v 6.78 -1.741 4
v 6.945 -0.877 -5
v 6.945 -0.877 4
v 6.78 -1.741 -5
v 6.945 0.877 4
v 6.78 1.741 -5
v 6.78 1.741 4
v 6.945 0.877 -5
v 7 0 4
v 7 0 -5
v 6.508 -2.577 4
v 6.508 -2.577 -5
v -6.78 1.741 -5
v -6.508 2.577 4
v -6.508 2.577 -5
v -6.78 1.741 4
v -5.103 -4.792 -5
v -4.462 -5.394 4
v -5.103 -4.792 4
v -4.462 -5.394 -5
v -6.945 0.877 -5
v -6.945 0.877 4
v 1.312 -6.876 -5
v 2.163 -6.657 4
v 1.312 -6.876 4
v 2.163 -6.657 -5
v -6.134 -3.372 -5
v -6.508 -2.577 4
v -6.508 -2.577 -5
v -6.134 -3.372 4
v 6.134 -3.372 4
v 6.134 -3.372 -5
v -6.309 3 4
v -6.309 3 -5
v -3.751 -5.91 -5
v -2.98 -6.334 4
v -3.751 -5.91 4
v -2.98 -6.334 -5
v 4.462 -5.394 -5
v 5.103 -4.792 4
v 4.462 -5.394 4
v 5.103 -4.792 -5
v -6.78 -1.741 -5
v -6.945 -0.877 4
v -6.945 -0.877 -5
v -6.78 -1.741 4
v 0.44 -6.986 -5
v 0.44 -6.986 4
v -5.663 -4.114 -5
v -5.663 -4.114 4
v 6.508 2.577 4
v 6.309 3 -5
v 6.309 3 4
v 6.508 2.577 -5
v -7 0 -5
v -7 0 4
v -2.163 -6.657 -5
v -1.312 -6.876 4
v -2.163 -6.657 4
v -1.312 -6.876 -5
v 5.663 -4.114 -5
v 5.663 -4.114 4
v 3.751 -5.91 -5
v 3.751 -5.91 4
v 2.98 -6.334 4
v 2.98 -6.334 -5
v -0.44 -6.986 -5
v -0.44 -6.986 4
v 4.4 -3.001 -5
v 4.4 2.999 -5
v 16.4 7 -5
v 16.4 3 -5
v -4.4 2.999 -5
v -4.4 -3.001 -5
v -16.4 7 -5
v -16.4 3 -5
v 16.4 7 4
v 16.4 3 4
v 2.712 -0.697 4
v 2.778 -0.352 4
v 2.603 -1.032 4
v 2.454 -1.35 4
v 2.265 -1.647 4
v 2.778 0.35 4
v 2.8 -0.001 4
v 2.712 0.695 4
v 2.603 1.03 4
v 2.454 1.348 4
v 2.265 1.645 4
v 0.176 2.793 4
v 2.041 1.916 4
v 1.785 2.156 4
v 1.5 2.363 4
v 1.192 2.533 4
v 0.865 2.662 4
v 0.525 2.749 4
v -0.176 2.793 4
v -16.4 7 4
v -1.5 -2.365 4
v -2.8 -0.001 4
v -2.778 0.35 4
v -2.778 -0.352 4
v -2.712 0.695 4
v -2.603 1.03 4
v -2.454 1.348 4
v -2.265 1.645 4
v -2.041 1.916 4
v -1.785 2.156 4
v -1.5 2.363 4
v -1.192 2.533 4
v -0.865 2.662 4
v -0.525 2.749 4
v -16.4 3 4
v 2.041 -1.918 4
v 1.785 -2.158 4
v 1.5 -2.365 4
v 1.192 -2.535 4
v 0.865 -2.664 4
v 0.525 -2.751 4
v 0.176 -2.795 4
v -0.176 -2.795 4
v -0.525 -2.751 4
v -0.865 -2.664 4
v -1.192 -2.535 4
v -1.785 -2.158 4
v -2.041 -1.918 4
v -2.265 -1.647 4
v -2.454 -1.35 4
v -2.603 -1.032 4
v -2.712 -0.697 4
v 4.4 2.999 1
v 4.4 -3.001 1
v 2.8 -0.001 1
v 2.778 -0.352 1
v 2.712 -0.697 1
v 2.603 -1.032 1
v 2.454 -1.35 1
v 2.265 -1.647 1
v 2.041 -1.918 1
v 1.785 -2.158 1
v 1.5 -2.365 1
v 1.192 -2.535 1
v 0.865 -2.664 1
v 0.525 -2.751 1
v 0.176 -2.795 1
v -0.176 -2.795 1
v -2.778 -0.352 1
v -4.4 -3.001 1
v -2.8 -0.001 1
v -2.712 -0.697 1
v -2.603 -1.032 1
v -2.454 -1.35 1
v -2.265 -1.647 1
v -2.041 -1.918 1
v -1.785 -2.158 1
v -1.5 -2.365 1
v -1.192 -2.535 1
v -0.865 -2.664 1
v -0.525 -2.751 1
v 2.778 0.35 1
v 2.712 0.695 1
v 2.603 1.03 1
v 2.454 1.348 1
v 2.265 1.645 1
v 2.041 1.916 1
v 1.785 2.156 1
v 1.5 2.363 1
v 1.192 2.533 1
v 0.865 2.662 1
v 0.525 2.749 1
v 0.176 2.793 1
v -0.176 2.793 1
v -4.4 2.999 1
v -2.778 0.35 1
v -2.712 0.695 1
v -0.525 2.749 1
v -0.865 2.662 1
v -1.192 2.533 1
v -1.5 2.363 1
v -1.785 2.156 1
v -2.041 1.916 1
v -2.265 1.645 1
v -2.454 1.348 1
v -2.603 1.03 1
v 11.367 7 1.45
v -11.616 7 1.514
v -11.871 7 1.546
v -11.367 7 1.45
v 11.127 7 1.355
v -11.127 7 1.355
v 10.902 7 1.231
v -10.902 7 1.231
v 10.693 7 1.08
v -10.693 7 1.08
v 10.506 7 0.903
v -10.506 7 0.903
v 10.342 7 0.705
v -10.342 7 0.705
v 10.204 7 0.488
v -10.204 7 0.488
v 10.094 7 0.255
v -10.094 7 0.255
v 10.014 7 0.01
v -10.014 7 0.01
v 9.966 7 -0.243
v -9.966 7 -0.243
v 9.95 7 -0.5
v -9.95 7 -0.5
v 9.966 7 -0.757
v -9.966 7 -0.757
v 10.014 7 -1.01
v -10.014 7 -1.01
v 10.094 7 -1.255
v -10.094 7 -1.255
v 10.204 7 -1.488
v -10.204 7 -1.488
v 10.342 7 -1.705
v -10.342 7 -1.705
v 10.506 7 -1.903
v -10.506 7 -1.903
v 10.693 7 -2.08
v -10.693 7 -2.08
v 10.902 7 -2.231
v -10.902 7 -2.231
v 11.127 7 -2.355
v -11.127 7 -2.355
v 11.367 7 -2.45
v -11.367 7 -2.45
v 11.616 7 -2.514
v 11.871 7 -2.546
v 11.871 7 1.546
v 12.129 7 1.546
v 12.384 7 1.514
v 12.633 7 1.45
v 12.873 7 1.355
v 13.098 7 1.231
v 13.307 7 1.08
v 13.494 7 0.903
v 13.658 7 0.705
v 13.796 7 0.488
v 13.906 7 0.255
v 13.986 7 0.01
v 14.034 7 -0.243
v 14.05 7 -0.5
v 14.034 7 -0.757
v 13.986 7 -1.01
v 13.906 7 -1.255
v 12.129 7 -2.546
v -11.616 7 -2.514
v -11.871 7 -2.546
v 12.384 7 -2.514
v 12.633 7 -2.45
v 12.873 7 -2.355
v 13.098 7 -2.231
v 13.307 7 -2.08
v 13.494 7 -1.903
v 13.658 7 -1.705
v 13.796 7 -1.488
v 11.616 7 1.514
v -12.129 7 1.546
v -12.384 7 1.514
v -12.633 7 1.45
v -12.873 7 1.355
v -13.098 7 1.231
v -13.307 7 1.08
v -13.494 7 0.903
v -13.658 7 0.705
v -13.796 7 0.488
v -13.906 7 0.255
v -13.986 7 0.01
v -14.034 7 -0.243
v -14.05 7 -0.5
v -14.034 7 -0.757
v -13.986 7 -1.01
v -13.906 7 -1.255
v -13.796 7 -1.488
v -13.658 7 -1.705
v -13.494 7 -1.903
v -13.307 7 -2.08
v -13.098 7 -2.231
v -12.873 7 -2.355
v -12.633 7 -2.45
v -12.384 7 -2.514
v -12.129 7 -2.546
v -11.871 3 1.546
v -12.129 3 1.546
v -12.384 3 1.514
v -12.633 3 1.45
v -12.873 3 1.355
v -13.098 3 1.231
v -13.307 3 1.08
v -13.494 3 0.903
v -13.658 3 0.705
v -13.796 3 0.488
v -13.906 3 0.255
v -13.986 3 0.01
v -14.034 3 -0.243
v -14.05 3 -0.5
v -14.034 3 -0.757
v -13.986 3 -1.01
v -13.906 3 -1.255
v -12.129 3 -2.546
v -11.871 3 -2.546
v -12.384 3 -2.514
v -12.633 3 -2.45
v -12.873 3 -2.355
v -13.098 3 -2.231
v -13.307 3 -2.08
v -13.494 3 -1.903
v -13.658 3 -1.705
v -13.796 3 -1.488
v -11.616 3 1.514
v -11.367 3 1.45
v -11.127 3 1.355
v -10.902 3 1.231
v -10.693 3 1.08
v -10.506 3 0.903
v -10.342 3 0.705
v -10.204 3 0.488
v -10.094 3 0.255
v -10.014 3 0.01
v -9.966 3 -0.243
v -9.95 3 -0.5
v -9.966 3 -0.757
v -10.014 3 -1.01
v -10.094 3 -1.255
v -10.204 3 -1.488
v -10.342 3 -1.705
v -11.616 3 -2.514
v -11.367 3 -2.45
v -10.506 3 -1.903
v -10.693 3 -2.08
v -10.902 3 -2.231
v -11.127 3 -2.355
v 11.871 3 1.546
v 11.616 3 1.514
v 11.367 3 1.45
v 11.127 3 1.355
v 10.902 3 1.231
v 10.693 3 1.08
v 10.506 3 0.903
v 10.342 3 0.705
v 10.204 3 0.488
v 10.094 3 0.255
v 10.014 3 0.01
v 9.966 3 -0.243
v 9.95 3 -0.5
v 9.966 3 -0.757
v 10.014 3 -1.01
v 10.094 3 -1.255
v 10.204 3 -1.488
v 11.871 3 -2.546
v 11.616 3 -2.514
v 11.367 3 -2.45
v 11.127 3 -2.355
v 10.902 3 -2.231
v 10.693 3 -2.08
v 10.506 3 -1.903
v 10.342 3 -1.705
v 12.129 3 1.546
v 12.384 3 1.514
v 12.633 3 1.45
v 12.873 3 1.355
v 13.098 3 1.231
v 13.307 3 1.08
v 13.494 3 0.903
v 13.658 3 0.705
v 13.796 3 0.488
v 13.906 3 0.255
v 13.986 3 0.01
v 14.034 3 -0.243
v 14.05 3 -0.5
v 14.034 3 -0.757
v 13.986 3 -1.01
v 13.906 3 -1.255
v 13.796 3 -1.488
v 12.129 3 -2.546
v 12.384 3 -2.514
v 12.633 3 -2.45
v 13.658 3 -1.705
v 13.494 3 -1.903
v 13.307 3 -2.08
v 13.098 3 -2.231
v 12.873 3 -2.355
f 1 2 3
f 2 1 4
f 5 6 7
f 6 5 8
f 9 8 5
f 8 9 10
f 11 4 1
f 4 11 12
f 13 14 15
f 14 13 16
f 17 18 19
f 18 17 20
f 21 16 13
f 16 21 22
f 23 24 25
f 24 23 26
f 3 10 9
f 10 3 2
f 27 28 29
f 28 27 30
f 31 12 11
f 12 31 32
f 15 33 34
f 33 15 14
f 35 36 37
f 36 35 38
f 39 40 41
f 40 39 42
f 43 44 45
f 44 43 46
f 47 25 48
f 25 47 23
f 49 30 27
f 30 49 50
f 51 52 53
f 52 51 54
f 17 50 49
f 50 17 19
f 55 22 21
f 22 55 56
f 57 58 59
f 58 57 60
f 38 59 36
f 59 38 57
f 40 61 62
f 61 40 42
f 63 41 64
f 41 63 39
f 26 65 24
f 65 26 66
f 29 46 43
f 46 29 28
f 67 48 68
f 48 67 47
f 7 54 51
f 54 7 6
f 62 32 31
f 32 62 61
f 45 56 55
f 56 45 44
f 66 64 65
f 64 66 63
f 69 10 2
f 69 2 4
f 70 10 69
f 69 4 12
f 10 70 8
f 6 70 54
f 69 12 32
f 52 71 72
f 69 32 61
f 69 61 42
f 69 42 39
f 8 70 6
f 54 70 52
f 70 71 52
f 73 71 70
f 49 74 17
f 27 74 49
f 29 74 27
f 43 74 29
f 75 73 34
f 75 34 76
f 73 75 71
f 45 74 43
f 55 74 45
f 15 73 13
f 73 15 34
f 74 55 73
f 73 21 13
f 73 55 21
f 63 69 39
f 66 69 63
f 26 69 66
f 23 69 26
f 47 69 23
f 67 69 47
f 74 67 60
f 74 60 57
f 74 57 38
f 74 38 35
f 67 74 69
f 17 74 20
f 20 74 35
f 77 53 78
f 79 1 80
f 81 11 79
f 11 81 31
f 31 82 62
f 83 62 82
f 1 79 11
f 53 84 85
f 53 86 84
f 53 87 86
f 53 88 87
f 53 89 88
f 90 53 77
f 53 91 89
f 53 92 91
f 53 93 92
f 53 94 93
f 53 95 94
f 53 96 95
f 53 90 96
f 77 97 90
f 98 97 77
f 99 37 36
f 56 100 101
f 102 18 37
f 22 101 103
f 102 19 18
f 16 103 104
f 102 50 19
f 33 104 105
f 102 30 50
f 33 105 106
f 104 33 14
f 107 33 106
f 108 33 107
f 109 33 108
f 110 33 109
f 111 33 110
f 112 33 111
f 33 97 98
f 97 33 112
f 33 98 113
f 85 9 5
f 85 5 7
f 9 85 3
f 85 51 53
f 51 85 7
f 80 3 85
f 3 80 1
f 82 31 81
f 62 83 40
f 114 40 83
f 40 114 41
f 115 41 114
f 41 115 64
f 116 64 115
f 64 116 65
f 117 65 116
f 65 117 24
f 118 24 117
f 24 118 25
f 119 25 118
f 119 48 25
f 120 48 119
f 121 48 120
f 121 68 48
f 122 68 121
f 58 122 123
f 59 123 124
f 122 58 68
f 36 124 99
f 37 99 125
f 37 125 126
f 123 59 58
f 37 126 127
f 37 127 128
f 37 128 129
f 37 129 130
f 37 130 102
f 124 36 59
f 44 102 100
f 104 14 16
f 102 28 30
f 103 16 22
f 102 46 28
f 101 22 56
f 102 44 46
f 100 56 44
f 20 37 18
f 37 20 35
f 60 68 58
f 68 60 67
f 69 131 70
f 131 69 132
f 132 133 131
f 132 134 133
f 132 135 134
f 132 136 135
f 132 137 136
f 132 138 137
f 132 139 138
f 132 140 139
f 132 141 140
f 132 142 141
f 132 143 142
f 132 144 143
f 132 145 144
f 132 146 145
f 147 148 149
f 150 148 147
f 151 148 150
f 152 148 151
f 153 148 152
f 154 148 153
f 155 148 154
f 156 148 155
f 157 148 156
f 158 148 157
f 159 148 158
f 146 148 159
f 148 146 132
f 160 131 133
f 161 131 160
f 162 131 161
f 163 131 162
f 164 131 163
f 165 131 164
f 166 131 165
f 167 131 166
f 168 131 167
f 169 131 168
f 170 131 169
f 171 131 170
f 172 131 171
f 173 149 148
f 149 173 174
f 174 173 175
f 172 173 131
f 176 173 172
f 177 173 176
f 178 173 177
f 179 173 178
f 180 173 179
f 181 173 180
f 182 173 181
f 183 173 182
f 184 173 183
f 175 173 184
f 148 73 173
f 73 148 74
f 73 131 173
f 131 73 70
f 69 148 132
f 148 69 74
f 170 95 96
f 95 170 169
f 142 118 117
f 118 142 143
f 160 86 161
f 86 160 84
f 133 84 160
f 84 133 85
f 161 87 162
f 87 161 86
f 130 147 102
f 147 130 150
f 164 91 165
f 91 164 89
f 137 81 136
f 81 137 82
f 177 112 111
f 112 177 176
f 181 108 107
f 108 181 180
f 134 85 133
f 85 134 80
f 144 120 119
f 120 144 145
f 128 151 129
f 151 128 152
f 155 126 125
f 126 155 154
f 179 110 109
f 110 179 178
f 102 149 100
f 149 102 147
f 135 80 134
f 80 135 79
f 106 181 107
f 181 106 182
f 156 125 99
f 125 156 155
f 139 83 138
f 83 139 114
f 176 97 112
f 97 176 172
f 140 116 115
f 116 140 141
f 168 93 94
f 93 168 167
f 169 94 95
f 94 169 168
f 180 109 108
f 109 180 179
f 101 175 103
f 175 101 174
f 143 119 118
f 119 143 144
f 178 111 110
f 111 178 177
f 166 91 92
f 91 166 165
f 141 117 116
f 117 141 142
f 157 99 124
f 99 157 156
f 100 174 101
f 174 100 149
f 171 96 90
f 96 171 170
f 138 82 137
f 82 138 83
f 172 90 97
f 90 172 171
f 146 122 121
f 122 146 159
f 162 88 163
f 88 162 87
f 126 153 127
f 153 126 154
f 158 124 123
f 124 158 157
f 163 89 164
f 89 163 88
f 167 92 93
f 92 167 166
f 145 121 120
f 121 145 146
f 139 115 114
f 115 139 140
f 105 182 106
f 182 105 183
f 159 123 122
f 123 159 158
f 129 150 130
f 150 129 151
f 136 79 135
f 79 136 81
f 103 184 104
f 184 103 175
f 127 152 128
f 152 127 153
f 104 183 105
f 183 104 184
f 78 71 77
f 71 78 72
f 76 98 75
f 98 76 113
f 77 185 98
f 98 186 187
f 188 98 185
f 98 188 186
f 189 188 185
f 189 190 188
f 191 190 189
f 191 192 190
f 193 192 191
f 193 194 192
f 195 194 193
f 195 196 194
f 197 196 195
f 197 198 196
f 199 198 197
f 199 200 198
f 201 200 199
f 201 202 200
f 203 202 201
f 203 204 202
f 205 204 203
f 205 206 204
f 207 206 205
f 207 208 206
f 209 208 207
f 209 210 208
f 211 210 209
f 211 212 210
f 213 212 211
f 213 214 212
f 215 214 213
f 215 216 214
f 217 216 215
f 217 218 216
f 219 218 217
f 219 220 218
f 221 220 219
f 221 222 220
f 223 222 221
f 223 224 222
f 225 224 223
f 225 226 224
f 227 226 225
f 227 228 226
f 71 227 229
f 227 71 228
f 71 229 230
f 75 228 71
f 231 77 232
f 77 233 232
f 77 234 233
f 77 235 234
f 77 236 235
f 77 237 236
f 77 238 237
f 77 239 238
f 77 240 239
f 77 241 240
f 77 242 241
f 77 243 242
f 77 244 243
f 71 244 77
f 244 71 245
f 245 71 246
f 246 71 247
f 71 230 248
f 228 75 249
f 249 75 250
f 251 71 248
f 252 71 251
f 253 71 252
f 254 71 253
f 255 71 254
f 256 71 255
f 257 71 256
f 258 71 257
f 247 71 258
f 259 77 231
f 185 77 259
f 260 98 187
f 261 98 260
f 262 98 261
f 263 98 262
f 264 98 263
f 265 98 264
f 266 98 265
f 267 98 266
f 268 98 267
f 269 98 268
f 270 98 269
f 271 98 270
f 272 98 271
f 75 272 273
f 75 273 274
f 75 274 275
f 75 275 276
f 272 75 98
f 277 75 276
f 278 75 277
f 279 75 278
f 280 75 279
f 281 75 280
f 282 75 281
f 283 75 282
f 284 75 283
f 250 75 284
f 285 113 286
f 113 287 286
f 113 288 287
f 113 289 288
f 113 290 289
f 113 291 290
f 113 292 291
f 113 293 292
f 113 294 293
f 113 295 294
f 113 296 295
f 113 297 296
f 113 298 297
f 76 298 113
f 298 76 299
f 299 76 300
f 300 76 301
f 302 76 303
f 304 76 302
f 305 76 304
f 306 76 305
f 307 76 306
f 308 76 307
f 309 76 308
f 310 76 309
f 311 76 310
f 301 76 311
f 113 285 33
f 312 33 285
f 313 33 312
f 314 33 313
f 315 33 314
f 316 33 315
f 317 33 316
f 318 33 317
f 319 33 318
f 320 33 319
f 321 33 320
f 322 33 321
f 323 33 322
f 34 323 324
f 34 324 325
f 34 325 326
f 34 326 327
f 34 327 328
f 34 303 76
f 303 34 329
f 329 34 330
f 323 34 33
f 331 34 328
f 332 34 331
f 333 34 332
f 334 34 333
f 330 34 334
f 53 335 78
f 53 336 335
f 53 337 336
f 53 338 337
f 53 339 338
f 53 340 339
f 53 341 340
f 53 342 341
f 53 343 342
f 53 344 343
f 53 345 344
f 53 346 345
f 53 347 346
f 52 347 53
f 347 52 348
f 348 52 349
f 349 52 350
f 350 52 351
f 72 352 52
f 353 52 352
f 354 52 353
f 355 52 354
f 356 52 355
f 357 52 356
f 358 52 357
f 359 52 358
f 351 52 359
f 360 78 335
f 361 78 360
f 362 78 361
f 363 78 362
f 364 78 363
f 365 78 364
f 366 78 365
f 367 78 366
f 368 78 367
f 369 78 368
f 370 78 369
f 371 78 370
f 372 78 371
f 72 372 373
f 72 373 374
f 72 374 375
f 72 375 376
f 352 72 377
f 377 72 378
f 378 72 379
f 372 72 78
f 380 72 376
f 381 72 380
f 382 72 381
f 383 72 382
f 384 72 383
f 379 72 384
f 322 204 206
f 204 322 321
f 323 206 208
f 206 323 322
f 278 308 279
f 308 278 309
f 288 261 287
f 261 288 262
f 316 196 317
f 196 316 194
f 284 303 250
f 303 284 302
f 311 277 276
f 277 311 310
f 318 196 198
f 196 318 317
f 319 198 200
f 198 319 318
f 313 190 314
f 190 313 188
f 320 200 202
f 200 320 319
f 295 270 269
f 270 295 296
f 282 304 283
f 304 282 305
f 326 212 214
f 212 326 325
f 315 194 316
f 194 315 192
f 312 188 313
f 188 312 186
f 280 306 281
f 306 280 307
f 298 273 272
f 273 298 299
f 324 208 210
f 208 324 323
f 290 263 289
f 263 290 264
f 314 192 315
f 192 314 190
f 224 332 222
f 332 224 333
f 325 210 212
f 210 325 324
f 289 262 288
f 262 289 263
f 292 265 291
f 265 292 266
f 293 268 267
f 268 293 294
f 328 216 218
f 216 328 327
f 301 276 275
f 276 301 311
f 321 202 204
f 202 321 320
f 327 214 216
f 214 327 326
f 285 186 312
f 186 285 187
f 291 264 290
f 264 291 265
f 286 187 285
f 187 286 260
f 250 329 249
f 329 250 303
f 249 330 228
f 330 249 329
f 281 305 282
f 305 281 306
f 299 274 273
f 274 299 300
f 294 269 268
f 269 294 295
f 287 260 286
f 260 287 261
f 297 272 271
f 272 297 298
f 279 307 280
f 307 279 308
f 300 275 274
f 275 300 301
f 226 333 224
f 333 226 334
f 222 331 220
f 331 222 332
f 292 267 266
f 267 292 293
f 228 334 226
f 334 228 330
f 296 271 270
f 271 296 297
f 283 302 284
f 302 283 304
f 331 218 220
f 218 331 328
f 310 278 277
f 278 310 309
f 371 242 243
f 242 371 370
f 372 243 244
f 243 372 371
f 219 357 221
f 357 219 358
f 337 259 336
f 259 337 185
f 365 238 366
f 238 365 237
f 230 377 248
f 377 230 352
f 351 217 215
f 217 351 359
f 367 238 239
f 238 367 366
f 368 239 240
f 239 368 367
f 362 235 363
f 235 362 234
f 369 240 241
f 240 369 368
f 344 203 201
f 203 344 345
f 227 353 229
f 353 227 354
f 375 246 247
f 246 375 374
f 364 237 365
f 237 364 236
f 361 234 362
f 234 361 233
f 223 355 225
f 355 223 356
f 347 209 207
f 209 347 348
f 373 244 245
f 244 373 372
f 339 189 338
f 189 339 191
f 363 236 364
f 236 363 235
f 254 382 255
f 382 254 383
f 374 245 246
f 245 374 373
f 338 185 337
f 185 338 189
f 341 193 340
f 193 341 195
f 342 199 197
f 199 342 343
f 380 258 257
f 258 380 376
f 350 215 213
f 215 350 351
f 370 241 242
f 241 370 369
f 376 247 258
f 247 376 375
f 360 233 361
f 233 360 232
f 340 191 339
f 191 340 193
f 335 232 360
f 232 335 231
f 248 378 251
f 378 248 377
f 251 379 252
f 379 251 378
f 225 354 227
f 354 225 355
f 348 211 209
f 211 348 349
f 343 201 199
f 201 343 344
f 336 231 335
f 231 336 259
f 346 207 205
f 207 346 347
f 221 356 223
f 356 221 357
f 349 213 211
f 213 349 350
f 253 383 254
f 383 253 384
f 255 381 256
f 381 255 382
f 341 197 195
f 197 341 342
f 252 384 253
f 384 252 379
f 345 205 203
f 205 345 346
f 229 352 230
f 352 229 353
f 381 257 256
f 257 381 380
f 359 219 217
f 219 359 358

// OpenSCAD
wall = 4;
washer_d = 10;
thread_d = 5;
tol = 0.6;
//width = 5.4;
//height = 8.2;
width = 8.2;
height = 5.4;
length = 5;
base_width = 2 * height + 2 * 11;
hole_d = 3.5;

// delta = -( wall / 4 );
delta = 0;

del = -1e-3;

module box(){
    difference(){
    translate( [ 0, delta, -length ] )
        cylinder( d = washer_d + wall, h = 4 + length, $fn = 50 );
        translate( [ 0, del, -length + 1  ] )
            cube( [ width + tol, height + tol, 2 * length ], center = true );
    }
}

difference(){
    box();
    translate( [ 0, del, -length - 1 ] )
        cylinder( d = thread_d + tol, h = 4 + length + 2, $fn = 50 );
}

difference(){
    translate( [ -base_width / 2, ( height + tol ) / 2, -length ] )
        cube( [ base_width, wall / 2 + ( washer_d - height ) / 2 - tol / 2, length + 4 ] );
    
    translate( [ -12, 50, -( length - 4 ) / 2 ] )
        rotate( 90, [ 1, 0, 0 ] )
            cylinder( d = hole_d + tol, h = 100, $fn = 50 );
    translate( [ 12, 50, -( length - 4 ) / 2 ] )
        rotate( 90, [ 1, 0, 0 ] )
            cylinder( d = hole_d + tol, h = 100, $fn = 50 );
}
